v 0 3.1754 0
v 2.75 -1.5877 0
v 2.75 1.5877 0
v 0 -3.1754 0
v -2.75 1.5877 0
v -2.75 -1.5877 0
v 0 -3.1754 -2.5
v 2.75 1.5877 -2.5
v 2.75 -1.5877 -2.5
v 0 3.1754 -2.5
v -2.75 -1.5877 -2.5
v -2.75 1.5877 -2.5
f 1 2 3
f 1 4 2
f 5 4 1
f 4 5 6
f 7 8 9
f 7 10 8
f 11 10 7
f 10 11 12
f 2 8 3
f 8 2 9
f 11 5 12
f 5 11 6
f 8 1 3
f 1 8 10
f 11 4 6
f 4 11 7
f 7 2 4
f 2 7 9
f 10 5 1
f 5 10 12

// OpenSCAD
// Generated by SolidPython 1.1.3 on 2022-06-04 18:09:17
$fn = 48;


difference() {
	union() {
		translate(v = [0, 0, 0]) {
			rotate(a = [0, 0, 0]) {
				translate(v = [0, 0, 0]) {
					rotate(a = [0, 0, 0]) {
						difference() {
							translate(v = [0, 0, -1.2500000000]) {
								cube(center = true, size = [11.0000000000, 11.0000000000, 2.5000000000]);
							}
							difference() {
								union() {
									translate(v = [8.2500000000, 0, 0]) {
										rotate(a = [0, 0, 0]) {
											translate(v = [0, 0, -1.2500000000]) {
												cube(center = true, size = [11.0000000000, 11.0000000000, 2.5000000000]);
											}
										}
									}
									translate(v = [-8.2500000000, 0, 0]) {
										rotate(a = [0, 0, 0]) {
											translate(v = [0, 0, -1.2500000000]) {
												cube(center = true, size = [11.0000000000, 11.0000000000, 2.5000000000]);
											}
										}
									}
								}
								union();
							}
							rotate(a = [0, 0, 60]) {
								difference() {
									union() {
										translate(v = [8.2500000000, 0, 0]) {
											rotate(a = [0, 0, 0]) {
												translate(v = [0, 0, -1.2500000000]) {
													cube(center = true, size = [11.0000000000, 11.0000000000, 2.5000000000]);
												}
											}
										}
										translate(v = [-8.2500000000, 0, 0]) {
											rotate(a = [0, 0, 0]) {
												translate(v = [0, 0, -1.2500000000]) {
													cube(center = true, size = [11.0000000000, 11.0000000000, 2.5000000000]);
												}
											}
										}
									}
									union();
								}
							}
							rotate(a = [0, 0, -60]) {
								difference() {
									union() {
										translate(v = [8.2500000000, 0, 0]) {
											rotate(a = [0, 0, 0]) {
												translate(v = [0, 0, -1.2500000000]) {
													cube(center = true, size = [11.0000000000, 11.0000000000, 2.5000000000]);
												}
											}
										}
										translate(v = [-8.2500000000, 0, 0]) {
											rotate(a = [0, 0, 0]) {
												translate(v = [0, 0, -1.2500000000]) {
													cube(center = true, size = [11.0000000000, 11.0000000000, 2.5000000000]);
												}
											}
										}
									}
									union();
								}
							}
						}
					}
				}
			}
		}
	}
	union();
}
/***********************************************
*********      SolidPython code:      **********
************************************************
 
import OPSC_dimensions as od
from solid.objects import cube, cylinder, difference, translate, union, hull, rotate, linear_extrude, square, offset, projection, intersection
from solid import scad_render_to_file


def setMode(mode="3DPR"):
    od.changeMode(mode)

def getMode():
    return od.mode

def saveToScad(fileName, parts):
    file_out = scad_render_to_file(parts, fileName, file_header=f'$fn = 48;')


def insert(item,pos=[None,None,None],x=0,y=0,z=0,ex=0,size=[None,None,None],length=0,rot=[None,None,None],rotX=0,rotY=0,rotZ=0,width=0,height=0,depth=100,rad=0,rad2=0,color="gray",alpha=1,OOwidth=0,OOheight=0,holes=True,negative=True, name=""):
    return OPSCInsert(item,pos,x,y,z,ex,size,length,rot,rotX,rotY,rotZ,width,height,depth,rad,rad2,color,alpha,OOwidth,OOheight,holes,negative,name)


def OPSCInsert(item,pos=[None,None,None],x=0,y=0,z=0,ex=0,size=[None,None,None],length=0,rot=[None,None,None],rotX=0,rotY=0,rotZ=0,width=0,height=0,depth=100,rad=0,rad2=0,color="gray",alpha=1,OOwidth=0,OOheight=0,holes=True,negative=True, name=""):
    
    """
        color(color,alpha){
            translate([x,y,z]){
                    rotate([rotX,rotY,rotZ]){
    """
    returnValue = ""

    print(pos)

    if pos[0] != None:
        x=pos[0]
        y=pos[1]
        z=pos[2]
    if rot[0] != None:
        rotX=rot[0]
        rotY=rot[1]
        rotZ=rot[2]
    
    returnValue = translate((x,y,z))(
            rotate((rotX,rotY,rotZ))(
                OPSCInsertIf(item,pos,x,y,z,ex,size,length,rot,rotX,rotY,rotZ,width,height,depth,rad,rad2,color,alpha,OOwidth,OOheight,holes,negative,name)
            )
        )
    

    return returnValue

def OPSCInsertIf(item,pos=[None,None,None],x=0,y=0,z=0,ex=0,size=[None,None,None],length=0,rot=[None,None,None],rotX=0,rotY=0,rotZ=0,width=0,height=0,depth=100,rad=0,rad2=0,color="gray",alpha=1,OOwidth=0,OOheight=0,holes=True,negative=True, name=""):
    returnValue = cube([10,10,10])

    if size[0] != None:
        width=size[0]
        height=size[1]
        depth=size[2]

    print("    OPSCInsert item:" + str(item) + " at:[" + str(x) + "," + str(y) + "," + str(z) + "] size: [" + str(width) + "," + str(height) + "," + str(depth) + "]")

    if(item=="cube"):
        returnValue =  translate([0,0,-depth/2])(cube([width,height,depth],center=True))
    elif(item=="cylinder"):        
        returnValue = translate([0,0,-depth/2])(cylinder(r=rad,h=depth,center=True))
    elif(item=="plane"):
        returnValue = insert("cube",size=[1000,1000,0.1],color=color)    
    elif(item=="cubeRounded"):
        if(rad == 0):
                            rad = 5
        returnValue =  translate([0,0,-depth])(
                        linear_extrude(height=depth)(                        
                            offset(r=rad)(
                                square((width-rad*2+.01,height-rad*2+.01),center=True)
                                )
                            )
        )

    ######  Holes    
    elif(item == "holeM1"):
        returnValue = OSPCgetHole(rad=1)
    elif(item == "holeM2"):
        returnValue = OSPCgetHole(rad=2)
    elif(item == "holeM3"):
        returnValue = OSPCgetHole(rad=3)
    elif(item == "holeM4"):
        returnValue = OSPCgetHole(rad=4)
    elif(item == "holeM5"):
        returnValue = OSPCgetHole(rad=5)
    elif(item == "holeM6"):
        returnValue = OSPCgetHole(rad=6)
    elif(item == "hole"):
        returnValue = OSPCgetHole(rad=rad)

    ######  Nuts
    elif(item == "nutM1"):
        returnValue = OSPCgetNut(rad=1,depth=depth)
    elif(item == "nutM2"):
        returnValue = OSPCgetNut(rad=2,depth=depth)
    elif(item == "nutM3"):
        returnValue = OSPCgetNut(rad=3,depth=depth)
    elif(item == "nutM4"):
        returnValue = OSPCgetNut(rad=4,depth=depth)
    elif(item == "nutM5"):
        returnValue = OSPCgetNut(rad=5,depth=depth)
    elif(item == "nutM6"):
        returnValue = OSPCgetNut(rad=6,depth=depth)
    elif(item == "nut"):
        returnValue = OSPCgetNut(rad=rad,depth=depth)
    return returnValue

                

def OSPCgetHole(rad):
    return translate([0,0,-250])(cylinder(r=od.holeM[rad-1],h=500))

def OSPCgetNut(rad,depth):
    print(depth)
    print(od.nutM)
    depth = od.nutM[rad-1][od.NUTDEPTH] if depth==100 else depth
    returnValue = OPSChexagon(od.nutM[rad-1][od.NUTWIDTH],depth=depth)
    return returnValue

def OPSChexagon(width,depth):
    cutter = item()
    wid=width*2
    cutter.addPos(insert("cube",pos=[wid/2+width/2,0,0],size=[wid,wid,depth]))
    cutter.addPos(insert("cube",pos=[-wid/2-width/2,0,0],size=[wid,wid,depth]))

    cut = cutter.getPart()
    print(depth)
    returnValue = difference()(
        translate([0,0,-depth/2])(cube([wid,wid,depth],center=True)),
        cut,
        rotate([0,0,60])(cut),
        rotate([0,0,-60])(cut)
    )

    return returnValue




class item:

    def __init__(self):
        self.posItems=list()
        self.negItems=list()


    def addPos(self,part):
        self.posItems.append(part)
    def addNeg(self,part):
        self.negItems.append(part)

    def getPart(self):
        returnValue = difference()(
            union()(self.posItems),
            union()(self.negItems)
        )
        return returnValue

    def getLaser(self,start=0,layers=1,thickness=-3,tileDif=200):
        rv= []

        for x in range(layers):
            rv.append(translate([0,x*tileDif,0])(
                    projection()(
                        intersection()(
                            insert("plane",z=start+x*thickness),
                            self.getPart()
                        )
                    )
            )
            )
        return union()(rv)
 
 
************************************************/
